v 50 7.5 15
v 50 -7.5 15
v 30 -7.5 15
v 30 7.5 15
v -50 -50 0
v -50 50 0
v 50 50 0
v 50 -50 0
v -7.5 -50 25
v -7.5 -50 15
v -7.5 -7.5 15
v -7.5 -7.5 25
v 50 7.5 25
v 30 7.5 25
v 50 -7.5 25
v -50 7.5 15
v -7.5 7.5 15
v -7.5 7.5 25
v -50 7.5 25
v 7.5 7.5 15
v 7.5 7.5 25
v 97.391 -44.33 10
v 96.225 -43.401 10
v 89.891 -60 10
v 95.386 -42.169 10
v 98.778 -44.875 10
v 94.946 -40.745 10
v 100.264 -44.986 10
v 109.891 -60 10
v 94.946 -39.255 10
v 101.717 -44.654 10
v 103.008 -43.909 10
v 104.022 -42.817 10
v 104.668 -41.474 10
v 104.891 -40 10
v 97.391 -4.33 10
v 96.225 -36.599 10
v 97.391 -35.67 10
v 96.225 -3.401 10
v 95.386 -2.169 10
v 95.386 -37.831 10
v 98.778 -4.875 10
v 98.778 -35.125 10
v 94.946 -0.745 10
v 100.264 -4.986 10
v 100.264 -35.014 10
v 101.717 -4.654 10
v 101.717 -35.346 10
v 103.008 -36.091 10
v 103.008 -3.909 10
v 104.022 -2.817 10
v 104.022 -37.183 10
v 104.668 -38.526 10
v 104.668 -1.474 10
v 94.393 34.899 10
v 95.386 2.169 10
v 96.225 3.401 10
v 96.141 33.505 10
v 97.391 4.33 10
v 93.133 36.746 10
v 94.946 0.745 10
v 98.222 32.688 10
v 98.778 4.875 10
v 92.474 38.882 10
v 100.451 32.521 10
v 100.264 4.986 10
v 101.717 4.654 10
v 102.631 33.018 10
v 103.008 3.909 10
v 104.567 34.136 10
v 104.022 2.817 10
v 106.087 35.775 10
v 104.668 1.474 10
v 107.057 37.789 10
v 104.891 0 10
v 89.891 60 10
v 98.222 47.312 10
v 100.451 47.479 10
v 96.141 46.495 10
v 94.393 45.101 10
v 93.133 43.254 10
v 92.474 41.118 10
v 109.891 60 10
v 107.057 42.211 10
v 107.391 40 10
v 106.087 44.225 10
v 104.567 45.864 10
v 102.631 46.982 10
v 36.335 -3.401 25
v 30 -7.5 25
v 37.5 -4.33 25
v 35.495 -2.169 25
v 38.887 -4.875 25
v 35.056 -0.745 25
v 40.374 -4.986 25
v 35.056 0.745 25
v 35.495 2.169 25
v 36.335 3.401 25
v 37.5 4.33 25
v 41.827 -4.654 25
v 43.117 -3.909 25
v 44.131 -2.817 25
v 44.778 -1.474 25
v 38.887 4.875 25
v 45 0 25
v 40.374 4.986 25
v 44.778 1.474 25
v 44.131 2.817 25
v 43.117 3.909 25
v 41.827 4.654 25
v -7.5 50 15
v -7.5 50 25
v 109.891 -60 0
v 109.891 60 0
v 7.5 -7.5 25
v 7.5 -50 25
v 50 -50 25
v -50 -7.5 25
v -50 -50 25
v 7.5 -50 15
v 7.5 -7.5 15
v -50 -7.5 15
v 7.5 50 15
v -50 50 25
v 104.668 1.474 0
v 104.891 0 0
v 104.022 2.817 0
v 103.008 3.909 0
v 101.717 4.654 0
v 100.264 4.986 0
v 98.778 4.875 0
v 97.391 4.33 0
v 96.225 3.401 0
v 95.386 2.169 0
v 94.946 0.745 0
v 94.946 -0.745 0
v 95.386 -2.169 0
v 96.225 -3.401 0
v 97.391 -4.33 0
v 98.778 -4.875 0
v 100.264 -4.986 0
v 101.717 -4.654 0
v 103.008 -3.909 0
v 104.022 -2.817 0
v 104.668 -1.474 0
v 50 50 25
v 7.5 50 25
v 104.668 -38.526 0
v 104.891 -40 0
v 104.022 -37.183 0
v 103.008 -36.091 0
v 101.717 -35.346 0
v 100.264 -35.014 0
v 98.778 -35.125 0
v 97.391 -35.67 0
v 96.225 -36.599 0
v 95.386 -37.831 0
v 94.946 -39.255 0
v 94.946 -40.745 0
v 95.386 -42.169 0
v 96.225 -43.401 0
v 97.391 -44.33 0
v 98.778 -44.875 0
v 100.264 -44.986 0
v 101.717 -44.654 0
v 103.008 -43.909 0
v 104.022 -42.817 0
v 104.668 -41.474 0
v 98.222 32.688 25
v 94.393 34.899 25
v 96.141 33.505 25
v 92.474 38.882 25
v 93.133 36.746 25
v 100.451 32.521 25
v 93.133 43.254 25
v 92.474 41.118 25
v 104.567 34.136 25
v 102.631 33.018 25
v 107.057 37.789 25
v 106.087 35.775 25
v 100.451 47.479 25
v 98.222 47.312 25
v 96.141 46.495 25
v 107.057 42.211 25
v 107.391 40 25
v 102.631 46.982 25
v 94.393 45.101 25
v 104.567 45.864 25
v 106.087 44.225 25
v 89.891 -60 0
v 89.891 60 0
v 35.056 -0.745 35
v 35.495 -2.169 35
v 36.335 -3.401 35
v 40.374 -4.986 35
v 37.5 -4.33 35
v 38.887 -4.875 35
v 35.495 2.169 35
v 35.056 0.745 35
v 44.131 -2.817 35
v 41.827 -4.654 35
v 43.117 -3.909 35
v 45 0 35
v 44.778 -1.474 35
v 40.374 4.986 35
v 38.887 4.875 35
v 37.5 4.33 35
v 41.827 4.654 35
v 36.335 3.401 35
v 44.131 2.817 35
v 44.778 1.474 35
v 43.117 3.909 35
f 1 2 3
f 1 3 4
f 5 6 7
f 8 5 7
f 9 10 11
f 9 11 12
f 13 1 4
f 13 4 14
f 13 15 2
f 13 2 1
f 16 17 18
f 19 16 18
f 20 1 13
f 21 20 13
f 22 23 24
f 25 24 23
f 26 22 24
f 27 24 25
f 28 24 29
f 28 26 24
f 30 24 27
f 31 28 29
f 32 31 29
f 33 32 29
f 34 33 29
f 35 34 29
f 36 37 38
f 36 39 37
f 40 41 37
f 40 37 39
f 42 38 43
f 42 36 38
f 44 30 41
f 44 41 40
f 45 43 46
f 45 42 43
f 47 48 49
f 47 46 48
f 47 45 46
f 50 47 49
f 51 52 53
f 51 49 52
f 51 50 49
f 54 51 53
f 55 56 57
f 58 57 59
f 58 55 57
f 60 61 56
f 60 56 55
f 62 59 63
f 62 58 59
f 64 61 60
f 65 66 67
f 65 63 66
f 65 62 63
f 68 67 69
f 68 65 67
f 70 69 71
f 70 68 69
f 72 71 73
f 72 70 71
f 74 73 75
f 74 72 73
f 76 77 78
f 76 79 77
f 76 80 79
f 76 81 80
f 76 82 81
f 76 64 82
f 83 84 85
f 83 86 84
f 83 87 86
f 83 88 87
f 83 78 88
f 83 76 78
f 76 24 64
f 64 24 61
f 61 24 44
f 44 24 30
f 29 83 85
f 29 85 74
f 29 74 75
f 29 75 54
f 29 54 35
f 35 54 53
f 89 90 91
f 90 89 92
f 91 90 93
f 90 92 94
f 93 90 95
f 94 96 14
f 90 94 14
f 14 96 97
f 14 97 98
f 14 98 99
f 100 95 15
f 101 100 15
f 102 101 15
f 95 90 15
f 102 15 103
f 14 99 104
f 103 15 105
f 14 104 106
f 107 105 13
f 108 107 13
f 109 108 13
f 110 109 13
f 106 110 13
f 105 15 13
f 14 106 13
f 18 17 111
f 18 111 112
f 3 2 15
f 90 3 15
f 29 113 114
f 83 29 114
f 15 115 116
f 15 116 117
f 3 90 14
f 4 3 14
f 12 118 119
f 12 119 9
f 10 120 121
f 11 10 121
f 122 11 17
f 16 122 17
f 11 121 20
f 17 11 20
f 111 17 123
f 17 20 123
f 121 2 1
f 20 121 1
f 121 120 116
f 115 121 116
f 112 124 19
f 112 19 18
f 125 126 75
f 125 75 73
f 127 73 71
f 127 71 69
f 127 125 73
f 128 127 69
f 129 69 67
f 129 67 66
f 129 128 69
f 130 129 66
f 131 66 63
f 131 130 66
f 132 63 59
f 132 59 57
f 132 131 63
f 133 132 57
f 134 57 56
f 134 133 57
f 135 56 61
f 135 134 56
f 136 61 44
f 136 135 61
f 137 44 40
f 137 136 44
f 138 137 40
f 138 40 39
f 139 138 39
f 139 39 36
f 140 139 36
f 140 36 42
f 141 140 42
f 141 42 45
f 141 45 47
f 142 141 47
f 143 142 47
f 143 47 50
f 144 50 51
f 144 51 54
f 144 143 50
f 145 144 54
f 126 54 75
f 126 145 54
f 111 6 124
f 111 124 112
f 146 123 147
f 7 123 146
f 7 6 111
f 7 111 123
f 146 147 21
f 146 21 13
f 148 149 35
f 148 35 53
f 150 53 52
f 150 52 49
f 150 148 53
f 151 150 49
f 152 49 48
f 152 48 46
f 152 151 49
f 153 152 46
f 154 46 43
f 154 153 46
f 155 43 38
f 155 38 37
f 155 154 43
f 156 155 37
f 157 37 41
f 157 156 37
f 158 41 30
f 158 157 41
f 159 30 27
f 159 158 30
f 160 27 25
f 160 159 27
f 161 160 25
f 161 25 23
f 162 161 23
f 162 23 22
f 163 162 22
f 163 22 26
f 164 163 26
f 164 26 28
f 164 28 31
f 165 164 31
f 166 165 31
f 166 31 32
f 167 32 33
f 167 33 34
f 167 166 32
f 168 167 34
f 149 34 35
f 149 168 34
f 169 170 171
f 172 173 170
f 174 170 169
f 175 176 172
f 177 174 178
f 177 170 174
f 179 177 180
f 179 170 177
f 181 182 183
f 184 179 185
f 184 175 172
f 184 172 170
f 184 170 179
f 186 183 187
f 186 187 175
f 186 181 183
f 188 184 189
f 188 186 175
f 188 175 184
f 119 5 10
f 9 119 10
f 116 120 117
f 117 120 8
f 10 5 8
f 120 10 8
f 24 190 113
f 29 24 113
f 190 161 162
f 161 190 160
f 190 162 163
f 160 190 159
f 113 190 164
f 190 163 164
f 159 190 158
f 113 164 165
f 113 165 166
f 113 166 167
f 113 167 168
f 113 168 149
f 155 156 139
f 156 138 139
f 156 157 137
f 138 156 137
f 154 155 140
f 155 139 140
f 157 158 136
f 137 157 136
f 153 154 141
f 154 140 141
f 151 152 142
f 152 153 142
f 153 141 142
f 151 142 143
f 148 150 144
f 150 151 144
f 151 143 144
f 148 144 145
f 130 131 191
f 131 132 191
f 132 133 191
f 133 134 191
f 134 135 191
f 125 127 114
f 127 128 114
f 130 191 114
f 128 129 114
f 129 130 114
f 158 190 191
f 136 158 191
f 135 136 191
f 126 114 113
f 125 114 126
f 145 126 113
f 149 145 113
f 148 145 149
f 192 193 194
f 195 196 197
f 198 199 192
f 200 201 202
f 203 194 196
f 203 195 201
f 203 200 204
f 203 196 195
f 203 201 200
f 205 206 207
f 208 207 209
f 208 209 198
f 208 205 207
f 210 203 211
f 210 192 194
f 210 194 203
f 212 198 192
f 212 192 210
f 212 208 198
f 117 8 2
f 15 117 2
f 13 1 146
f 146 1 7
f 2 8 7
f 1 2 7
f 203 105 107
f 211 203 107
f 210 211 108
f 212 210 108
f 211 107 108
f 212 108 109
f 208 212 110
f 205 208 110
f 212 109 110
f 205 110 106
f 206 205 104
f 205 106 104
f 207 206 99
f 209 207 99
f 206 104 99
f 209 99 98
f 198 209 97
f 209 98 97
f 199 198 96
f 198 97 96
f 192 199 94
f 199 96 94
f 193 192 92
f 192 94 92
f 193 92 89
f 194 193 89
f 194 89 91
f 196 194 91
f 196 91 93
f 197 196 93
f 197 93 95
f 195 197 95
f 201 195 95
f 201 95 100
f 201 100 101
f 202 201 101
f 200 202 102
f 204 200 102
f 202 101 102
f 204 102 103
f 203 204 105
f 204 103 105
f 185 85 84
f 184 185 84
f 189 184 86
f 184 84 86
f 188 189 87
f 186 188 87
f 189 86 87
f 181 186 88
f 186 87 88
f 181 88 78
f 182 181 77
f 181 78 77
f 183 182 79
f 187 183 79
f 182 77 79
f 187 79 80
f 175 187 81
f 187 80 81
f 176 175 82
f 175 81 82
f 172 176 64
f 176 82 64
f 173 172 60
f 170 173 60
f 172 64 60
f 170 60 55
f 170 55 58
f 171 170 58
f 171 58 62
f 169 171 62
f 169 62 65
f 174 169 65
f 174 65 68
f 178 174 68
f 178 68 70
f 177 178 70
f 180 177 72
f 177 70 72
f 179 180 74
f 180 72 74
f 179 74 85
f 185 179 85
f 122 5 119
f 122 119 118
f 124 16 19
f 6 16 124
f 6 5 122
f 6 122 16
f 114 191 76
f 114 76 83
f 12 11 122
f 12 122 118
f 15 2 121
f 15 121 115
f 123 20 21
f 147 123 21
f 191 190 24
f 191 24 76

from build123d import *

# Parameters (mm, degrees)
F0_W      = 100
F0_H      = 100
F1_DEPTH  = 25
F2_W      = 15
F2_H      = 10
F3_DEPTH  = 100
F4_W      = 15
F4_H      = 10
F5_DEPTH  = 100
F6_DEPTH  = 20
F7_R      = 5
F8_DEPTH  = 10
F9_W      = 20
F9_H      = 120
F9_R      = 5
F10_DEPTH = 10
F11_R     = 7.5
F12_DEPTH = 15


with BuildPart() as f1:
    # F0 (on Top) → F1 (new body)
    with BuildSketch(Plane.XY):
        Rectangle(F0_W, F0_H)
    extrude(amount=F1_DEPTH)

    # F2 (on face) → F3 (cut, through all)
    with BuildSketch(Plane.YZ.offset(50)):
        with Locations((0, 20)):
            Rectangle(F2_W, F2_H)
    extrude(amount=-F3_DEPTH, mode=Mode.SUBTRACT)

    # F4 (on face) → F5 (cut, through all)
    with BuildSketch(Plane.XZ.offset(50)):
        with Locations((0, 20)):
            Rectangle(F4_W, F4_H)
    extrude(amount=-F5_DEPTH, mode=Mode.SUBTRACT)


with BuildPart() as f6:
    # F2 (on face) → F6 (new body)
    with BuildSketch(Plane.YZ.offset(50)):
        with Locations((0, 20)):
            Rectangle(F2_W, F2_H)
    extrude(amount=-F6_DEPTH)

    # F7 (on face) → F8 (join)
    with BuildSketch(Plane.XY.offset(25)):
        with Locations((40, 0)):
            Circle(F7_R)
    extrude(amount=F8_DEPTH)


with BuildPart() as f10:
    # F9 (on Top) → F10 (new body)
    with BuildSketch(Plane.XY):
        with Locations((99.890538, 0)):
            Rectangle(F9_W, F9_H)
        with Locations((99.890538, -40)):
            Circle(F9_R, mode=Mode.SUBTRACT)
        with Locations((99.890538, 0)):
            Circle(F9_R, mode=Mode.SUBTRACT)
    extrude(amount=F10_DEPTH)

    # F11 (on face) → F12 (join)
    with BuildSketch(Plane.XY.offset(10)):
        with Locations((99.890538, 40)):
            Circle(F11_R)
    extrude(amount=F12_DEPTH)


solid = Compound([f1.part, f6.part, f10.part])
